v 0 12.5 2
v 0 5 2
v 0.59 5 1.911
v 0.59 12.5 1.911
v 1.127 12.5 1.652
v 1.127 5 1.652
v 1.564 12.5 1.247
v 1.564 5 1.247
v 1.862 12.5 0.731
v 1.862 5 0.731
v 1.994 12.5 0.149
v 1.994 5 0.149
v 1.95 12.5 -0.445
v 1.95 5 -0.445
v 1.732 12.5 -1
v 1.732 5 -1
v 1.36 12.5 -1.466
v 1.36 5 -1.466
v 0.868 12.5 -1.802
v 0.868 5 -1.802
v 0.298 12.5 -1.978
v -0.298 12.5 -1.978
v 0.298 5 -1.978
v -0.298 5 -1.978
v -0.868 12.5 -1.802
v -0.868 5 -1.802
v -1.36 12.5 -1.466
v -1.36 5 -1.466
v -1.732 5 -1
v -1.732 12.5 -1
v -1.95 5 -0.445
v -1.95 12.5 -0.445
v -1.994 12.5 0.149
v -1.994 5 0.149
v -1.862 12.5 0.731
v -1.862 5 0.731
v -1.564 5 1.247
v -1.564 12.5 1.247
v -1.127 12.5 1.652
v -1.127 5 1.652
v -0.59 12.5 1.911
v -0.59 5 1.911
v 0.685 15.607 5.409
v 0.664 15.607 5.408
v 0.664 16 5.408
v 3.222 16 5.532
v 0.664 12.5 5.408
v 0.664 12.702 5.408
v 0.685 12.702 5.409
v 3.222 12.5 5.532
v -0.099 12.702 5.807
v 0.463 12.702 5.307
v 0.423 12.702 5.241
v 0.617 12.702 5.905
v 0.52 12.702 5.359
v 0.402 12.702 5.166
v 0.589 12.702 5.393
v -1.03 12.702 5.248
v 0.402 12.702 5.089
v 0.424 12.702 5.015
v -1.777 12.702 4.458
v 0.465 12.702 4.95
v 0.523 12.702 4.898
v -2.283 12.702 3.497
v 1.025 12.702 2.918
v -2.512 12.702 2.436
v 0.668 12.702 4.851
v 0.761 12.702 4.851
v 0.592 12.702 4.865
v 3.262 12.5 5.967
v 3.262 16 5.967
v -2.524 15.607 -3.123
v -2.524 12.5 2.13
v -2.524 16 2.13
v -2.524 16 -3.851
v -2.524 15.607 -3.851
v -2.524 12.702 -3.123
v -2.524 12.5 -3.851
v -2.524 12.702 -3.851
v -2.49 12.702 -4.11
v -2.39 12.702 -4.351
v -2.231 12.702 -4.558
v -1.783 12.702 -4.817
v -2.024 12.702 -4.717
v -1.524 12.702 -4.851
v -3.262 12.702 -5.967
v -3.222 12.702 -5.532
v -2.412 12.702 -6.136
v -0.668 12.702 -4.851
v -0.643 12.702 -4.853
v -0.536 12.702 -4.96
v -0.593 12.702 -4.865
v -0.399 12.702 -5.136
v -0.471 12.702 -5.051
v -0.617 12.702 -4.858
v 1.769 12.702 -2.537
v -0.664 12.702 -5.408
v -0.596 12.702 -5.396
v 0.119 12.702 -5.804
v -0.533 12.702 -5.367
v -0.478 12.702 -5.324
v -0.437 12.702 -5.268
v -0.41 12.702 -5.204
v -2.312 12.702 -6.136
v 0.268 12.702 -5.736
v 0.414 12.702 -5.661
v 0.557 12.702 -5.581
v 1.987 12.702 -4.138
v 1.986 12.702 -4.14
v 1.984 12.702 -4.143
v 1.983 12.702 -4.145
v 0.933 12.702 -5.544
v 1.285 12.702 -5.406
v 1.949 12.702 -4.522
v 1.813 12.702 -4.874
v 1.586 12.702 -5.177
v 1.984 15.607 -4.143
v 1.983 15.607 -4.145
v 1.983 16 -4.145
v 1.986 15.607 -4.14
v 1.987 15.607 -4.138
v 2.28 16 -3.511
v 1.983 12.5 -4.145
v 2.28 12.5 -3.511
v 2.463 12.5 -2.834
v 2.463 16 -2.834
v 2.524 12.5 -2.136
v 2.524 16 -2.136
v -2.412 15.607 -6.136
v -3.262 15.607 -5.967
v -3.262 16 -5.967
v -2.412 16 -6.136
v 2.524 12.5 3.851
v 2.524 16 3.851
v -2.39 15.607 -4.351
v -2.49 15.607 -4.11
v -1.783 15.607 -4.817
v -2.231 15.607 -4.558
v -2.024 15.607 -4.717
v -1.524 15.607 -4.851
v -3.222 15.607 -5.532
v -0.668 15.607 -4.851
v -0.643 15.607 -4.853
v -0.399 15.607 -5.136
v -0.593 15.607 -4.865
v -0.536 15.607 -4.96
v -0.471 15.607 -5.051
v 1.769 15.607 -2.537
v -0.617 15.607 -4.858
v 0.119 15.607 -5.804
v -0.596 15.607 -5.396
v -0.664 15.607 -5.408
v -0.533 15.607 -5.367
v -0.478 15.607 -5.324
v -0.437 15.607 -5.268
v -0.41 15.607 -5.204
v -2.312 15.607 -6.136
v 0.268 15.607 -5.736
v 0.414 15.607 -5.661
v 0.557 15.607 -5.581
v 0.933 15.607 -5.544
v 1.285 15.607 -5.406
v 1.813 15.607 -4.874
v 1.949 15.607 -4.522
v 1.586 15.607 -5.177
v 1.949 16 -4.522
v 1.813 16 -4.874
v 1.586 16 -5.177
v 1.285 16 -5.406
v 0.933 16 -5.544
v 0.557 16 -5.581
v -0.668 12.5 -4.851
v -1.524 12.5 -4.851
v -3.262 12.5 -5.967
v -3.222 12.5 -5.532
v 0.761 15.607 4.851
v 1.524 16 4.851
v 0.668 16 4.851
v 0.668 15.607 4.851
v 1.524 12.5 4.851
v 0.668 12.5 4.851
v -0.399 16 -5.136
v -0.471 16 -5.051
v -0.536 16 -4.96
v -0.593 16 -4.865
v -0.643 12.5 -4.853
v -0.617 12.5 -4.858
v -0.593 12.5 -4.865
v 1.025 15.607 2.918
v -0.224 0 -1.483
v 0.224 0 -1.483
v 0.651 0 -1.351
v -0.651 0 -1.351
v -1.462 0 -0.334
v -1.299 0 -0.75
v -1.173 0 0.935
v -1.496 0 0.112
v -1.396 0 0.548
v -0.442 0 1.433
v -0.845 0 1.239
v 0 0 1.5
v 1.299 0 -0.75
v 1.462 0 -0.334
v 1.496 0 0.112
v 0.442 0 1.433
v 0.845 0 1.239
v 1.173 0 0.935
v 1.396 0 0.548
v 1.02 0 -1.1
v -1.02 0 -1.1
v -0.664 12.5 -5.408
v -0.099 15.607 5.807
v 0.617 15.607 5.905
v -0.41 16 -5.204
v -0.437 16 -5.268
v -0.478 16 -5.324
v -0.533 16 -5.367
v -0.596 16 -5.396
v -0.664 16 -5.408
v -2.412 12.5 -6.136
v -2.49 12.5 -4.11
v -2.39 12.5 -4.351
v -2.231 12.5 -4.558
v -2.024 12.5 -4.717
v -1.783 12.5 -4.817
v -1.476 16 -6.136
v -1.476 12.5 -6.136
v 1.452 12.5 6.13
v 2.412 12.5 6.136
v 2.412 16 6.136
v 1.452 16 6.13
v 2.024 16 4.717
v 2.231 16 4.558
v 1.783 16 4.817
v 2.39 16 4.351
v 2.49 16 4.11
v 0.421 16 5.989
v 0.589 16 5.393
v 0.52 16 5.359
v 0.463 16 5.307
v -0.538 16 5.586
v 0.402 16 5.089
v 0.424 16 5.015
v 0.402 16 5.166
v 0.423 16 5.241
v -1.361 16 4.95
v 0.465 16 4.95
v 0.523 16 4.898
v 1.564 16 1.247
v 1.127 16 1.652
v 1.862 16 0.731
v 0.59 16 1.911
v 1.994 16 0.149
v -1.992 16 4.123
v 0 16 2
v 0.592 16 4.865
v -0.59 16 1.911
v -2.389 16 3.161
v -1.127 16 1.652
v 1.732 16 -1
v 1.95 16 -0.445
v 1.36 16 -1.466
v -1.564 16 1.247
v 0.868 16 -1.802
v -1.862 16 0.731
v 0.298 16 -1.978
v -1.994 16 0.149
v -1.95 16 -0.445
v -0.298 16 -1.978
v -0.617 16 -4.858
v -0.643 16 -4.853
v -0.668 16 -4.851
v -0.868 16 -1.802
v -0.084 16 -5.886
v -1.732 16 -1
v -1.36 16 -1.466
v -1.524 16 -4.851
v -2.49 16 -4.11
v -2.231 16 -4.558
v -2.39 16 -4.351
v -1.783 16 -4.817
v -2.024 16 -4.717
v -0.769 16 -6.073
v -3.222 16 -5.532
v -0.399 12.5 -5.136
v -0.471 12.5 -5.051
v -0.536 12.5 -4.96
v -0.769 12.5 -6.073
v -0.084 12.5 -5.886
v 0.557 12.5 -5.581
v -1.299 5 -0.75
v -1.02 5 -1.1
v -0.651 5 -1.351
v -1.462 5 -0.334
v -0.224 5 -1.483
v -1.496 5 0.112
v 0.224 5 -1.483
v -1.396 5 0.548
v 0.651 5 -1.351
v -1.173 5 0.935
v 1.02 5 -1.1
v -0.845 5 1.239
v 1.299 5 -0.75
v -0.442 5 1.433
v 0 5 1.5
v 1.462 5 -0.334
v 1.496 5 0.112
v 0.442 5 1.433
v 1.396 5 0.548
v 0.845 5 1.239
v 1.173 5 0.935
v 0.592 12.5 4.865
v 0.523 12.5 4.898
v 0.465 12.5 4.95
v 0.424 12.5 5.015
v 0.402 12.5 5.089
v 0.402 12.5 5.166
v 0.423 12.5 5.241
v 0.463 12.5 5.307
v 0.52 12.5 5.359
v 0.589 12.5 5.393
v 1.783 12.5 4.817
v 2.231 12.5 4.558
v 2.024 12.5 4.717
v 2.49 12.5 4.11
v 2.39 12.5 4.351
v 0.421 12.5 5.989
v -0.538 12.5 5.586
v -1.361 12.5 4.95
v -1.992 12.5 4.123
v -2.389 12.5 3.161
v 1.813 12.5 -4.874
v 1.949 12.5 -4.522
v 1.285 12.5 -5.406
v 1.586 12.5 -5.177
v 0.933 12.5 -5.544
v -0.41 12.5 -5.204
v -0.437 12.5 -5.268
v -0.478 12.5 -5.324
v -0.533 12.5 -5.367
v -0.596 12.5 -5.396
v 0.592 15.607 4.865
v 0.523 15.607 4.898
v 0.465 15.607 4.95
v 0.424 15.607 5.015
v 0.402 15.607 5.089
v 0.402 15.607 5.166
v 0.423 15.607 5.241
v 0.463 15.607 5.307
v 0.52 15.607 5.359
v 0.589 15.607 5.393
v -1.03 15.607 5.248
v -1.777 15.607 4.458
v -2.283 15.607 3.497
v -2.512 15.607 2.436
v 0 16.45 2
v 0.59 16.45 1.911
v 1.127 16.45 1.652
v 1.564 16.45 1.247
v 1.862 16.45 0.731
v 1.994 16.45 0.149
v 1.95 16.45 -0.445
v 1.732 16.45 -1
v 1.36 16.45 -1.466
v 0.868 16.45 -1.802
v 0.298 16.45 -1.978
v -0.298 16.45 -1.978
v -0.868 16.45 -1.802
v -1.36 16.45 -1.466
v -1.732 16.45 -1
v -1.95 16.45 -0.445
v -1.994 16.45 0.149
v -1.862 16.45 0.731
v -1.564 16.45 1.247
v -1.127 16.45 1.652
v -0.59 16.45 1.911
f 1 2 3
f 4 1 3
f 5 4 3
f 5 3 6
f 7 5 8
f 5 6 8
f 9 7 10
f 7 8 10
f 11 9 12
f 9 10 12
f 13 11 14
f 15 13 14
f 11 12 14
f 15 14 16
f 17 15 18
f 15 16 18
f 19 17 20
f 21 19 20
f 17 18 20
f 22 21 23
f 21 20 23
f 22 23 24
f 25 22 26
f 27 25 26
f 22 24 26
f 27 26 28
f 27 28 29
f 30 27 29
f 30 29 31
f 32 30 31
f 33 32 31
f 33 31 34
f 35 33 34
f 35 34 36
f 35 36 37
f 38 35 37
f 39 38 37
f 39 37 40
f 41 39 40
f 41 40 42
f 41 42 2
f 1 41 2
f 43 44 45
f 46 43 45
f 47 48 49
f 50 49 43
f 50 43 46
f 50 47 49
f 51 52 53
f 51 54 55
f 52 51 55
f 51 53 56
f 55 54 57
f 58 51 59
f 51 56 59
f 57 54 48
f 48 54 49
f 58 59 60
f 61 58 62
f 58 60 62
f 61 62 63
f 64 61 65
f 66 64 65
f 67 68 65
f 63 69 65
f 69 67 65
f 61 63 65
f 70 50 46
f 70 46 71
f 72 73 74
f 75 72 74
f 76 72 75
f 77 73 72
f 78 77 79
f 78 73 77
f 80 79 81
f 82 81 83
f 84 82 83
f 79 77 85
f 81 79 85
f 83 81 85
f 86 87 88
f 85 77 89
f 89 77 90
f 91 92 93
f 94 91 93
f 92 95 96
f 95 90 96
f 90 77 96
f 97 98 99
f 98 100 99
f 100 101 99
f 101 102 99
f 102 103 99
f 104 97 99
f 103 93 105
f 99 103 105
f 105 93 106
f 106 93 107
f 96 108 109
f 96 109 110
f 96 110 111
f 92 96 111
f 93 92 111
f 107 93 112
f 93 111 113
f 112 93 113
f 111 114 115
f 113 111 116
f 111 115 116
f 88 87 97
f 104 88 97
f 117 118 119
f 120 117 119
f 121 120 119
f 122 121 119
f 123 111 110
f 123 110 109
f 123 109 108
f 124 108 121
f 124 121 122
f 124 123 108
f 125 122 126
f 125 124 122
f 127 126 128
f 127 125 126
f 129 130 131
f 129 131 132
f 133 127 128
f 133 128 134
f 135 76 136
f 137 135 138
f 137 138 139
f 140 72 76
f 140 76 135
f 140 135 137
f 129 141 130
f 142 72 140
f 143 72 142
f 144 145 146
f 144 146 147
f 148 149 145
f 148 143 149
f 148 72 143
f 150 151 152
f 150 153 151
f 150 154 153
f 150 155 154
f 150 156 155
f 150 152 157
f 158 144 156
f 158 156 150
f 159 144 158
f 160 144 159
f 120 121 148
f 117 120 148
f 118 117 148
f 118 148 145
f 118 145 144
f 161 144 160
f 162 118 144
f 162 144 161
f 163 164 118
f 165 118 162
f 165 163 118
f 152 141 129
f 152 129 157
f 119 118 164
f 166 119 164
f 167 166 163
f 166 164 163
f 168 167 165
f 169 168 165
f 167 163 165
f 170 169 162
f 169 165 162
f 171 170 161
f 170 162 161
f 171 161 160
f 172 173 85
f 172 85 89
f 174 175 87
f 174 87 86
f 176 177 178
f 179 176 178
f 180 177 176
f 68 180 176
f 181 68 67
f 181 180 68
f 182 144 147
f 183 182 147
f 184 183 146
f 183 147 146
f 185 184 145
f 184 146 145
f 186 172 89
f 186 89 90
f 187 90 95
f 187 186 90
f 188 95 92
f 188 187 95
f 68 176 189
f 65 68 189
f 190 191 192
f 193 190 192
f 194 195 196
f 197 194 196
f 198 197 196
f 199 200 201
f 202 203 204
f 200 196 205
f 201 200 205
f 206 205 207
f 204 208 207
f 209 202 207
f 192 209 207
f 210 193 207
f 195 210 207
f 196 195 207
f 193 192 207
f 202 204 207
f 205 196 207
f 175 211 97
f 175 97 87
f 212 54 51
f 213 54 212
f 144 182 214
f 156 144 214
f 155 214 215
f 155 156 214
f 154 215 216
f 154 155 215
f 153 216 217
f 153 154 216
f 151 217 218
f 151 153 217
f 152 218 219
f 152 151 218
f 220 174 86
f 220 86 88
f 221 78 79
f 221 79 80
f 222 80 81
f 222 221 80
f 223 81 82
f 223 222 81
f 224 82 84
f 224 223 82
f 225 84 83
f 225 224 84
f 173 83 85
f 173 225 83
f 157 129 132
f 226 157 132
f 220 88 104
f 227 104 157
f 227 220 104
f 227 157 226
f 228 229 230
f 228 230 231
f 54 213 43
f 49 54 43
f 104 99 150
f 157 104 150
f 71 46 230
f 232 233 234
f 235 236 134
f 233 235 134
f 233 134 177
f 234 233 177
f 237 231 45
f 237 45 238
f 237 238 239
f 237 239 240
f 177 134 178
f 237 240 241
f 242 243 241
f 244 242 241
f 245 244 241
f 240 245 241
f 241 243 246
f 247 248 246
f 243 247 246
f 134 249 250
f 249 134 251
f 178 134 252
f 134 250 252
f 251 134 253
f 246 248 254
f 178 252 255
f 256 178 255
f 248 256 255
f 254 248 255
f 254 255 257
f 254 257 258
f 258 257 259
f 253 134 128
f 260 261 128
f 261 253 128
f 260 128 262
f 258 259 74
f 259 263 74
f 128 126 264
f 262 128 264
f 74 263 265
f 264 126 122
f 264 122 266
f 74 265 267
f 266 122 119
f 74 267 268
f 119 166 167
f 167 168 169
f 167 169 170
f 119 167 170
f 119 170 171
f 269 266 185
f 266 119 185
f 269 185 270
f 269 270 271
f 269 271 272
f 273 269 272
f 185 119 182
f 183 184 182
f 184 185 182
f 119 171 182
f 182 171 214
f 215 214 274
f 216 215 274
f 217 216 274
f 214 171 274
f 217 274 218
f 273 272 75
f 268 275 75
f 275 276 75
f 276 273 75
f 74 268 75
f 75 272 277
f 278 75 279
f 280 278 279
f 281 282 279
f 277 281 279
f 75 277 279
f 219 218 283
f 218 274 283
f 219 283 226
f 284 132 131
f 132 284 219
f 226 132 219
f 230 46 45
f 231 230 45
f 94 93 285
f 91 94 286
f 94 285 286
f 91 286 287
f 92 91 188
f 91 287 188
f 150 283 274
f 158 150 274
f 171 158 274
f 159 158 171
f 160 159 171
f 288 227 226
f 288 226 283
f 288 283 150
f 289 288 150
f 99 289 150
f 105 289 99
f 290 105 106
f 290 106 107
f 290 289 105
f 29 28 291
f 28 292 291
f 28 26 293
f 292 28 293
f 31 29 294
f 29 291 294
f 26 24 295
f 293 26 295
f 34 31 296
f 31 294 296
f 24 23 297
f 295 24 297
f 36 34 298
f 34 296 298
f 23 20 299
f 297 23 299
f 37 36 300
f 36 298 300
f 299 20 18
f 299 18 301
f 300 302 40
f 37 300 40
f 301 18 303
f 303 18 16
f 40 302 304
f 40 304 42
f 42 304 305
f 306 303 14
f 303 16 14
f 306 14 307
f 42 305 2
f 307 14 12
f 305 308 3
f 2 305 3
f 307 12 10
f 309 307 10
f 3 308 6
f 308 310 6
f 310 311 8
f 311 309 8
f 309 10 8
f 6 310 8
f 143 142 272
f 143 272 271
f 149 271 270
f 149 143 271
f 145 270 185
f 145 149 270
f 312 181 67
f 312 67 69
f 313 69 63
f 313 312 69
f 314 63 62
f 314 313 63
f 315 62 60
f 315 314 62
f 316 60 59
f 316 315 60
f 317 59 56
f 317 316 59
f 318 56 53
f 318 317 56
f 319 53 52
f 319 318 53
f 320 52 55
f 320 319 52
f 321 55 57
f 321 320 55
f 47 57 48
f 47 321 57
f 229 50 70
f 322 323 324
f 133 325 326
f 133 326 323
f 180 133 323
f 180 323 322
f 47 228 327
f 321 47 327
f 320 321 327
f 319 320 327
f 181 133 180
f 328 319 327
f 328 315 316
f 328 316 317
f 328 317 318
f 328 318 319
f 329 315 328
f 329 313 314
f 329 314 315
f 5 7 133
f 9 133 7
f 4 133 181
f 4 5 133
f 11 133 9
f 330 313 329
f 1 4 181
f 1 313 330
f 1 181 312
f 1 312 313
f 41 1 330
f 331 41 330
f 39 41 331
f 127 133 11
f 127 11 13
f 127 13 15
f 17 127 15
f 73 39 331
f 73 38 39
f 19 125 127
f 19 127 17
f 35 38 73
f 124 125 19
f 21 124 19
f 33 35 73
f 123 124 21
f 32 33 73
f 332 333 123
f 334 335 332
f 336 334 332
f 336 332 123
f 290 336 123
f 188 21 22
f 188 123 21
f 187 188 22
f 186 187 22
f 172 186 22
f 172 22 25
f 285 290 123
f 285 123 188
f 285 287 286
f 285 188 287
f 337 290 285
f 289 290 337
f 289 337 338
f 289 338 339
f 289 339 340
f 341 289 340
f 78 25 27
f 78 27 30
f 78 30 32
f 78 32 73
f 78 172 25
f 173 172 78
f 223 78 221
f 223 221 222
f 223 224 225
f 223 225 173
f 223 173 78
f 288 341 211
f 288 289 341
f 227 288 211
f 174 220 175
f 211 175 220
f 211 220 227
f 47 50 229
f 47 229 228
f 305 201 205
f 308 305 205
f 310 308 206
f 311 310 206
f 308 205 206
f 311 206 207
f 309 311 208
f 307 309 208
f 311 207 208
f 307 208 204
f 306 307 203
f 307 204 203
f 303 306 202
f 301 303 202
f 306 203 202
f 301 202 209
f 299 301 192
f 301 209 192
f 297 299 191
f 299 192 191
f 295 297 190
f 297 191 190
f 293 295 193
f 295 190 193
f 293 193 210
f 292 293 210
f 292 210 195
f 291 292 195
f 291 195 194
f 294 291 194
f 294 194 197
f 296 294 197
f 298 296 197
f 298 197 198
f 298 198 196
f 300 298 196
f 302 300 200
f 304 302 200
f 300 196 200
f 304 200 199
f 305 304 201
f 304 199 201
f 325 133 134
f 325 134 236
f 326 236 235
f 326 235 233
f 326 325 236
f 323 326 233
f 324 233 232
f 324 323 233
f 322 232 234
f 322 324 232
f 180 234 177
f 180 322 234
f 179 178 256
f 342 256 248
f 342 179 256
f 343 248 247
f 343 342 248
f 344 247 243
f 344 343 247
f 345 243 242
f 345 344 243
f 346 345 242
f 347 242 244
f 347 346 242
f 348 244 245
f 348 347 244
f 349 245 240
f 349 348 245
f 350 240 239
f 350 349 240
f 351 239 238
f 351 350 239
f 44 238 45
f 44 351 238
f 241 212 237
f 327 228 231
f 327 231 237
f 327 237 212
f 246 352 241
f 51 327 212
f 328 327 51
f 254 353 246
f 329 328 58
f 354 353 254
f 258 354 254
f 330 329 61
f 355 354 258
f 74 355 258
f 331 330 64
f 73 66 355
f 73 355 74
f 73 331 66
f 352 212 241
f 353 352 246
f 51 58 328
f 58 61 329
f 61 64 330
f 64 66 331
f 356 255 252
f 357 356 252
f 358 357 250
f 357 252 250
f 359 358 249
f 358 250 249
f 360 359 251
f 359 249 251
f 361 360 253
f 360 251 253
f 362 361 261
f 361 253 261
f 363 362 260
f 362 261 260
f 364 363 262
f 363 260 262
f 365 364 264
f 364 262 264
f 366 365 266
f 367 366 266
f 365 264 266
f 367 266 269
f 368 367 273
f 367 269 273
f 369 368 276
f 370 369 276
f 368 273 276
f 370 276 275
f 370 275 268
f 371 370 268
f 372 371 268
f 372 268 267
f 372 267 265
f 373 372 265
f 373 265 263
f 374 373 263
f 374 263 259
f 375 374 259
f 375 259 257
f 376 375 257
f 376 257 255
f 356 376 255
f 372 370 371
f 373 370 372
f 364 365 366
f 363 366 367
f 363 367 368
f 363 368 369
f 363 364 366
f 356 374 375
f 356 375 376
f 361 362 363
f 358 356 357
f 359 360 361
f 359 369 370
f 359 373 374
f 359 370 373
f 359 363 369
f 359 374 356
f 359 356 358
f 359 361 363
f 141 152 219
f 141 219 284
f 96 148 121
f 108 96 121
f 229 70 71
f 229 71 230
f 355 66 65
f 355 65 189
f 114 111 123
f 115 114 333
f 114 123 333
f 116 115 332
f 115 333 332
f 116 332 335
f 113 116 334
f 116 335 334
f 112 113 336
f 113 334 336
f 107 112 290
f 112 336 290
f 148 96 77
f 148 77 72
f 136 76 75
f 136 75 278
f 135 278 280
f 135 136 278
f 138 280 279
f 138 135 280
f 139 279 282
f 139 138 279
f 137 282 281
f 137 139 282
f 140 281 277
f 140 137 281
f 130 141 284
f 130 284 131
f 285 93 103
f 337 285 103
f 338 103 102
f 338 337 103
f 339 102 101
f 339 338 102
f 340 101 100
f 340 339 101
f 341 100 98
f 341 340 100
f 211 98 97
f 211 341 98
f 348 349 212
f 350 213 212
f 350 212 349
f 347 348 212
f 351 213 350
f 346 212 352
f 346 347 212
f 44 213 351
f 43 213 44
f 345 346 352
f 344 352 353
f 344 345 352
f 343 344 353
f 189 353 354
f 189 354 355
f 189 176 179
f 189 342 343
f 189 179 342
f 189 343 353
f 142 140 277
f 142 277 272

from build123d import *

# Parameters (mm, degrees)
SKETCH1_R           = 1.5
BOSS_EXTRUDE1_DEPTH = 5
SKETCH2_R           = 2
BOSS_EXTRUDE2_DEPTH = 11.45
BOSS_EXTRUDE6_DEPTH = 3.5
SKETCH4_R           = 0.5
BOSS_EXTRUDE5_DEPTH = 3.5
SKETCH5_W           = 3.014329637
SKETCH5_H           = 2.905175639
CUT_EXTRUDE1_DEPTH  = 19.229884569


with BuildPart() as part:
    # Sketch1 → Boss-Extrude1 (new body)
    with BuildSketch(Plane(origin=(0, 0, 0), x_dir=(1, 0, 0), z_dir=(0, 1, 0))):
        with Locations(Location((0, 0, 0), (0, 0, 270))):
            Circle(SKETCH1_R)
    extrude(amount=BOSS_EXTRUDE1_DEPTH)

    # Sketch2 → Boss-Extrude2 (add)
    with BuildSketch(Plane(origin=(0, 5, 0), x_dir=(1, 0, 0), z_dir=(0, 1, 0))):
        with Locations(Location((0, 0, 0), (0, 0, 270))):
            Circle(SKETCH2_R)
    extrude(amount=BOSS_EXTRUDE2_DEPTH)

    # Sketch6 → Boss-Extrude6 (add)
    with BuildSketch(Plane(origin=(0, 12.5, 0), x_dir=(1, 0, 0), z_dir=(0, 1, 0))):
        with BuildLine():
            Line((-2.524010645, -2.130146075), (-2.524010645, 3.851325134))
            ThreePointArc((-2.524010645, 3.851325134), (-2.231117427, 4.558431915), (-1.524010645, 4.851325134))
            Line((-1.524010645, 4.851325134), (-0.668009538, 4.851325134))
            ThreePointArc((-0.668009538, 4.851325134), (-0.399419742, 5.127808451), (-0.664387903, 5.407764478))
            Line((-0.664387903, 5.407764478), (-3.222291114, 5.531885865))
            Line((-3.222291114, 5.531885865), (-3.261907681, 5.966518704))
            Line((-3.261907681, 5.966518704), (-2.412173665, 6.135930219))
            Line((-2.412173665, 6.135930219), (-1.475989355, 6.135930219))
            ThreePointArc((-1.475989355, 6.135930219), (1.35243777, 4.964357344), (2.524010645, 2.135930219))
            Line((2.524010645, 2.135930219), (2.524010645, -3.851325134))
            ThreePointArc((2.524010645, -3.851325134), (2.231117427, -4.558431915), (1.524010645, -4.851325134))
            Line((1.524010645, -4.851325134), (0.668009538, -4.851325134))
            ThreePointArc((0.668009538, -4.851325134), (0.399419742, -5.127808451), (0.664387903, -5.407764478))
            Line((0.664387903, -5.407764478), (3.222291114, -5.531885865))
            Line((3.222291114, -5.531885865), (3.261907681, -5.966518704))
            Line((3.261907681, -5.966518704), (2.412173665, -6.135930219))
            Line((2.412173665, -6.135930219), (1.451593971, -6.130071682))
            ThreePointArc((1.451593971, -6.130071682), (-1.36104973, -4.949934938), (-2.524010645, -2.130146075))
        make_face()
    extrude(amount=BOSS_EXTRUDE6_DEPTH)

    # Sketch4 → Boss-Extrude5 (add)
    with BuildSketch(Plane(origin=(0, 12.5, 0), x_dir=(1, 0, 0), z_dir=(0, 1, 0))):
        with BuildLine():
            Line((0.882439523, -3.95958443), (1.971734047, 4.024950767))
            ThreePointArc((1.971734047, 4.024950767), (0.798204873, 5.569262908), (-0.746107269, 4.395733735))
            Line((-0.746107269, 4.395733735), (-1.835401792, -3.588801462))
            ThreePointArc((-1.835401792, -3.588801462), (-0.661872619, -5.133113604), (0.882439523, -3.95958443))
        make_face()
        with Locations((-0.476481135, -3.774192946)):
            Circle(SKETCH4_R, mode=Mode.SUBTRACT)
        with Locations((0.612813389, 4.210342251)):
            Circle(SKETCH4_R, mode=Mode.SUBTRACT)
    extrude(amount=BOSS_EXTRUDE5_DEPTH)

    # Sketch5 → Cut-Extrude1 (cut, through all)
    with BuildSketch(Plane(origin=(1.396633916, 0, 0.190536536), x_dir=(0.1351734199835011, 0, -0.9908219550100633), z_dir=(0.9908219550100633, 0, 0.1351734199835011))):
        with Locations((-4.25991475, 14.154353636)):
            Rectangle(SKETCH5_W, SKETCH5_H)
        with Locations((4.25991475, 14.154353636)):
            Rectangle(SKETCH5_W, SKETCH5_H)
    extrude(amount=-CUT_EXTRUDE1_DEPTH, mode=Mode.SUBTRACT)


solid = part.part
